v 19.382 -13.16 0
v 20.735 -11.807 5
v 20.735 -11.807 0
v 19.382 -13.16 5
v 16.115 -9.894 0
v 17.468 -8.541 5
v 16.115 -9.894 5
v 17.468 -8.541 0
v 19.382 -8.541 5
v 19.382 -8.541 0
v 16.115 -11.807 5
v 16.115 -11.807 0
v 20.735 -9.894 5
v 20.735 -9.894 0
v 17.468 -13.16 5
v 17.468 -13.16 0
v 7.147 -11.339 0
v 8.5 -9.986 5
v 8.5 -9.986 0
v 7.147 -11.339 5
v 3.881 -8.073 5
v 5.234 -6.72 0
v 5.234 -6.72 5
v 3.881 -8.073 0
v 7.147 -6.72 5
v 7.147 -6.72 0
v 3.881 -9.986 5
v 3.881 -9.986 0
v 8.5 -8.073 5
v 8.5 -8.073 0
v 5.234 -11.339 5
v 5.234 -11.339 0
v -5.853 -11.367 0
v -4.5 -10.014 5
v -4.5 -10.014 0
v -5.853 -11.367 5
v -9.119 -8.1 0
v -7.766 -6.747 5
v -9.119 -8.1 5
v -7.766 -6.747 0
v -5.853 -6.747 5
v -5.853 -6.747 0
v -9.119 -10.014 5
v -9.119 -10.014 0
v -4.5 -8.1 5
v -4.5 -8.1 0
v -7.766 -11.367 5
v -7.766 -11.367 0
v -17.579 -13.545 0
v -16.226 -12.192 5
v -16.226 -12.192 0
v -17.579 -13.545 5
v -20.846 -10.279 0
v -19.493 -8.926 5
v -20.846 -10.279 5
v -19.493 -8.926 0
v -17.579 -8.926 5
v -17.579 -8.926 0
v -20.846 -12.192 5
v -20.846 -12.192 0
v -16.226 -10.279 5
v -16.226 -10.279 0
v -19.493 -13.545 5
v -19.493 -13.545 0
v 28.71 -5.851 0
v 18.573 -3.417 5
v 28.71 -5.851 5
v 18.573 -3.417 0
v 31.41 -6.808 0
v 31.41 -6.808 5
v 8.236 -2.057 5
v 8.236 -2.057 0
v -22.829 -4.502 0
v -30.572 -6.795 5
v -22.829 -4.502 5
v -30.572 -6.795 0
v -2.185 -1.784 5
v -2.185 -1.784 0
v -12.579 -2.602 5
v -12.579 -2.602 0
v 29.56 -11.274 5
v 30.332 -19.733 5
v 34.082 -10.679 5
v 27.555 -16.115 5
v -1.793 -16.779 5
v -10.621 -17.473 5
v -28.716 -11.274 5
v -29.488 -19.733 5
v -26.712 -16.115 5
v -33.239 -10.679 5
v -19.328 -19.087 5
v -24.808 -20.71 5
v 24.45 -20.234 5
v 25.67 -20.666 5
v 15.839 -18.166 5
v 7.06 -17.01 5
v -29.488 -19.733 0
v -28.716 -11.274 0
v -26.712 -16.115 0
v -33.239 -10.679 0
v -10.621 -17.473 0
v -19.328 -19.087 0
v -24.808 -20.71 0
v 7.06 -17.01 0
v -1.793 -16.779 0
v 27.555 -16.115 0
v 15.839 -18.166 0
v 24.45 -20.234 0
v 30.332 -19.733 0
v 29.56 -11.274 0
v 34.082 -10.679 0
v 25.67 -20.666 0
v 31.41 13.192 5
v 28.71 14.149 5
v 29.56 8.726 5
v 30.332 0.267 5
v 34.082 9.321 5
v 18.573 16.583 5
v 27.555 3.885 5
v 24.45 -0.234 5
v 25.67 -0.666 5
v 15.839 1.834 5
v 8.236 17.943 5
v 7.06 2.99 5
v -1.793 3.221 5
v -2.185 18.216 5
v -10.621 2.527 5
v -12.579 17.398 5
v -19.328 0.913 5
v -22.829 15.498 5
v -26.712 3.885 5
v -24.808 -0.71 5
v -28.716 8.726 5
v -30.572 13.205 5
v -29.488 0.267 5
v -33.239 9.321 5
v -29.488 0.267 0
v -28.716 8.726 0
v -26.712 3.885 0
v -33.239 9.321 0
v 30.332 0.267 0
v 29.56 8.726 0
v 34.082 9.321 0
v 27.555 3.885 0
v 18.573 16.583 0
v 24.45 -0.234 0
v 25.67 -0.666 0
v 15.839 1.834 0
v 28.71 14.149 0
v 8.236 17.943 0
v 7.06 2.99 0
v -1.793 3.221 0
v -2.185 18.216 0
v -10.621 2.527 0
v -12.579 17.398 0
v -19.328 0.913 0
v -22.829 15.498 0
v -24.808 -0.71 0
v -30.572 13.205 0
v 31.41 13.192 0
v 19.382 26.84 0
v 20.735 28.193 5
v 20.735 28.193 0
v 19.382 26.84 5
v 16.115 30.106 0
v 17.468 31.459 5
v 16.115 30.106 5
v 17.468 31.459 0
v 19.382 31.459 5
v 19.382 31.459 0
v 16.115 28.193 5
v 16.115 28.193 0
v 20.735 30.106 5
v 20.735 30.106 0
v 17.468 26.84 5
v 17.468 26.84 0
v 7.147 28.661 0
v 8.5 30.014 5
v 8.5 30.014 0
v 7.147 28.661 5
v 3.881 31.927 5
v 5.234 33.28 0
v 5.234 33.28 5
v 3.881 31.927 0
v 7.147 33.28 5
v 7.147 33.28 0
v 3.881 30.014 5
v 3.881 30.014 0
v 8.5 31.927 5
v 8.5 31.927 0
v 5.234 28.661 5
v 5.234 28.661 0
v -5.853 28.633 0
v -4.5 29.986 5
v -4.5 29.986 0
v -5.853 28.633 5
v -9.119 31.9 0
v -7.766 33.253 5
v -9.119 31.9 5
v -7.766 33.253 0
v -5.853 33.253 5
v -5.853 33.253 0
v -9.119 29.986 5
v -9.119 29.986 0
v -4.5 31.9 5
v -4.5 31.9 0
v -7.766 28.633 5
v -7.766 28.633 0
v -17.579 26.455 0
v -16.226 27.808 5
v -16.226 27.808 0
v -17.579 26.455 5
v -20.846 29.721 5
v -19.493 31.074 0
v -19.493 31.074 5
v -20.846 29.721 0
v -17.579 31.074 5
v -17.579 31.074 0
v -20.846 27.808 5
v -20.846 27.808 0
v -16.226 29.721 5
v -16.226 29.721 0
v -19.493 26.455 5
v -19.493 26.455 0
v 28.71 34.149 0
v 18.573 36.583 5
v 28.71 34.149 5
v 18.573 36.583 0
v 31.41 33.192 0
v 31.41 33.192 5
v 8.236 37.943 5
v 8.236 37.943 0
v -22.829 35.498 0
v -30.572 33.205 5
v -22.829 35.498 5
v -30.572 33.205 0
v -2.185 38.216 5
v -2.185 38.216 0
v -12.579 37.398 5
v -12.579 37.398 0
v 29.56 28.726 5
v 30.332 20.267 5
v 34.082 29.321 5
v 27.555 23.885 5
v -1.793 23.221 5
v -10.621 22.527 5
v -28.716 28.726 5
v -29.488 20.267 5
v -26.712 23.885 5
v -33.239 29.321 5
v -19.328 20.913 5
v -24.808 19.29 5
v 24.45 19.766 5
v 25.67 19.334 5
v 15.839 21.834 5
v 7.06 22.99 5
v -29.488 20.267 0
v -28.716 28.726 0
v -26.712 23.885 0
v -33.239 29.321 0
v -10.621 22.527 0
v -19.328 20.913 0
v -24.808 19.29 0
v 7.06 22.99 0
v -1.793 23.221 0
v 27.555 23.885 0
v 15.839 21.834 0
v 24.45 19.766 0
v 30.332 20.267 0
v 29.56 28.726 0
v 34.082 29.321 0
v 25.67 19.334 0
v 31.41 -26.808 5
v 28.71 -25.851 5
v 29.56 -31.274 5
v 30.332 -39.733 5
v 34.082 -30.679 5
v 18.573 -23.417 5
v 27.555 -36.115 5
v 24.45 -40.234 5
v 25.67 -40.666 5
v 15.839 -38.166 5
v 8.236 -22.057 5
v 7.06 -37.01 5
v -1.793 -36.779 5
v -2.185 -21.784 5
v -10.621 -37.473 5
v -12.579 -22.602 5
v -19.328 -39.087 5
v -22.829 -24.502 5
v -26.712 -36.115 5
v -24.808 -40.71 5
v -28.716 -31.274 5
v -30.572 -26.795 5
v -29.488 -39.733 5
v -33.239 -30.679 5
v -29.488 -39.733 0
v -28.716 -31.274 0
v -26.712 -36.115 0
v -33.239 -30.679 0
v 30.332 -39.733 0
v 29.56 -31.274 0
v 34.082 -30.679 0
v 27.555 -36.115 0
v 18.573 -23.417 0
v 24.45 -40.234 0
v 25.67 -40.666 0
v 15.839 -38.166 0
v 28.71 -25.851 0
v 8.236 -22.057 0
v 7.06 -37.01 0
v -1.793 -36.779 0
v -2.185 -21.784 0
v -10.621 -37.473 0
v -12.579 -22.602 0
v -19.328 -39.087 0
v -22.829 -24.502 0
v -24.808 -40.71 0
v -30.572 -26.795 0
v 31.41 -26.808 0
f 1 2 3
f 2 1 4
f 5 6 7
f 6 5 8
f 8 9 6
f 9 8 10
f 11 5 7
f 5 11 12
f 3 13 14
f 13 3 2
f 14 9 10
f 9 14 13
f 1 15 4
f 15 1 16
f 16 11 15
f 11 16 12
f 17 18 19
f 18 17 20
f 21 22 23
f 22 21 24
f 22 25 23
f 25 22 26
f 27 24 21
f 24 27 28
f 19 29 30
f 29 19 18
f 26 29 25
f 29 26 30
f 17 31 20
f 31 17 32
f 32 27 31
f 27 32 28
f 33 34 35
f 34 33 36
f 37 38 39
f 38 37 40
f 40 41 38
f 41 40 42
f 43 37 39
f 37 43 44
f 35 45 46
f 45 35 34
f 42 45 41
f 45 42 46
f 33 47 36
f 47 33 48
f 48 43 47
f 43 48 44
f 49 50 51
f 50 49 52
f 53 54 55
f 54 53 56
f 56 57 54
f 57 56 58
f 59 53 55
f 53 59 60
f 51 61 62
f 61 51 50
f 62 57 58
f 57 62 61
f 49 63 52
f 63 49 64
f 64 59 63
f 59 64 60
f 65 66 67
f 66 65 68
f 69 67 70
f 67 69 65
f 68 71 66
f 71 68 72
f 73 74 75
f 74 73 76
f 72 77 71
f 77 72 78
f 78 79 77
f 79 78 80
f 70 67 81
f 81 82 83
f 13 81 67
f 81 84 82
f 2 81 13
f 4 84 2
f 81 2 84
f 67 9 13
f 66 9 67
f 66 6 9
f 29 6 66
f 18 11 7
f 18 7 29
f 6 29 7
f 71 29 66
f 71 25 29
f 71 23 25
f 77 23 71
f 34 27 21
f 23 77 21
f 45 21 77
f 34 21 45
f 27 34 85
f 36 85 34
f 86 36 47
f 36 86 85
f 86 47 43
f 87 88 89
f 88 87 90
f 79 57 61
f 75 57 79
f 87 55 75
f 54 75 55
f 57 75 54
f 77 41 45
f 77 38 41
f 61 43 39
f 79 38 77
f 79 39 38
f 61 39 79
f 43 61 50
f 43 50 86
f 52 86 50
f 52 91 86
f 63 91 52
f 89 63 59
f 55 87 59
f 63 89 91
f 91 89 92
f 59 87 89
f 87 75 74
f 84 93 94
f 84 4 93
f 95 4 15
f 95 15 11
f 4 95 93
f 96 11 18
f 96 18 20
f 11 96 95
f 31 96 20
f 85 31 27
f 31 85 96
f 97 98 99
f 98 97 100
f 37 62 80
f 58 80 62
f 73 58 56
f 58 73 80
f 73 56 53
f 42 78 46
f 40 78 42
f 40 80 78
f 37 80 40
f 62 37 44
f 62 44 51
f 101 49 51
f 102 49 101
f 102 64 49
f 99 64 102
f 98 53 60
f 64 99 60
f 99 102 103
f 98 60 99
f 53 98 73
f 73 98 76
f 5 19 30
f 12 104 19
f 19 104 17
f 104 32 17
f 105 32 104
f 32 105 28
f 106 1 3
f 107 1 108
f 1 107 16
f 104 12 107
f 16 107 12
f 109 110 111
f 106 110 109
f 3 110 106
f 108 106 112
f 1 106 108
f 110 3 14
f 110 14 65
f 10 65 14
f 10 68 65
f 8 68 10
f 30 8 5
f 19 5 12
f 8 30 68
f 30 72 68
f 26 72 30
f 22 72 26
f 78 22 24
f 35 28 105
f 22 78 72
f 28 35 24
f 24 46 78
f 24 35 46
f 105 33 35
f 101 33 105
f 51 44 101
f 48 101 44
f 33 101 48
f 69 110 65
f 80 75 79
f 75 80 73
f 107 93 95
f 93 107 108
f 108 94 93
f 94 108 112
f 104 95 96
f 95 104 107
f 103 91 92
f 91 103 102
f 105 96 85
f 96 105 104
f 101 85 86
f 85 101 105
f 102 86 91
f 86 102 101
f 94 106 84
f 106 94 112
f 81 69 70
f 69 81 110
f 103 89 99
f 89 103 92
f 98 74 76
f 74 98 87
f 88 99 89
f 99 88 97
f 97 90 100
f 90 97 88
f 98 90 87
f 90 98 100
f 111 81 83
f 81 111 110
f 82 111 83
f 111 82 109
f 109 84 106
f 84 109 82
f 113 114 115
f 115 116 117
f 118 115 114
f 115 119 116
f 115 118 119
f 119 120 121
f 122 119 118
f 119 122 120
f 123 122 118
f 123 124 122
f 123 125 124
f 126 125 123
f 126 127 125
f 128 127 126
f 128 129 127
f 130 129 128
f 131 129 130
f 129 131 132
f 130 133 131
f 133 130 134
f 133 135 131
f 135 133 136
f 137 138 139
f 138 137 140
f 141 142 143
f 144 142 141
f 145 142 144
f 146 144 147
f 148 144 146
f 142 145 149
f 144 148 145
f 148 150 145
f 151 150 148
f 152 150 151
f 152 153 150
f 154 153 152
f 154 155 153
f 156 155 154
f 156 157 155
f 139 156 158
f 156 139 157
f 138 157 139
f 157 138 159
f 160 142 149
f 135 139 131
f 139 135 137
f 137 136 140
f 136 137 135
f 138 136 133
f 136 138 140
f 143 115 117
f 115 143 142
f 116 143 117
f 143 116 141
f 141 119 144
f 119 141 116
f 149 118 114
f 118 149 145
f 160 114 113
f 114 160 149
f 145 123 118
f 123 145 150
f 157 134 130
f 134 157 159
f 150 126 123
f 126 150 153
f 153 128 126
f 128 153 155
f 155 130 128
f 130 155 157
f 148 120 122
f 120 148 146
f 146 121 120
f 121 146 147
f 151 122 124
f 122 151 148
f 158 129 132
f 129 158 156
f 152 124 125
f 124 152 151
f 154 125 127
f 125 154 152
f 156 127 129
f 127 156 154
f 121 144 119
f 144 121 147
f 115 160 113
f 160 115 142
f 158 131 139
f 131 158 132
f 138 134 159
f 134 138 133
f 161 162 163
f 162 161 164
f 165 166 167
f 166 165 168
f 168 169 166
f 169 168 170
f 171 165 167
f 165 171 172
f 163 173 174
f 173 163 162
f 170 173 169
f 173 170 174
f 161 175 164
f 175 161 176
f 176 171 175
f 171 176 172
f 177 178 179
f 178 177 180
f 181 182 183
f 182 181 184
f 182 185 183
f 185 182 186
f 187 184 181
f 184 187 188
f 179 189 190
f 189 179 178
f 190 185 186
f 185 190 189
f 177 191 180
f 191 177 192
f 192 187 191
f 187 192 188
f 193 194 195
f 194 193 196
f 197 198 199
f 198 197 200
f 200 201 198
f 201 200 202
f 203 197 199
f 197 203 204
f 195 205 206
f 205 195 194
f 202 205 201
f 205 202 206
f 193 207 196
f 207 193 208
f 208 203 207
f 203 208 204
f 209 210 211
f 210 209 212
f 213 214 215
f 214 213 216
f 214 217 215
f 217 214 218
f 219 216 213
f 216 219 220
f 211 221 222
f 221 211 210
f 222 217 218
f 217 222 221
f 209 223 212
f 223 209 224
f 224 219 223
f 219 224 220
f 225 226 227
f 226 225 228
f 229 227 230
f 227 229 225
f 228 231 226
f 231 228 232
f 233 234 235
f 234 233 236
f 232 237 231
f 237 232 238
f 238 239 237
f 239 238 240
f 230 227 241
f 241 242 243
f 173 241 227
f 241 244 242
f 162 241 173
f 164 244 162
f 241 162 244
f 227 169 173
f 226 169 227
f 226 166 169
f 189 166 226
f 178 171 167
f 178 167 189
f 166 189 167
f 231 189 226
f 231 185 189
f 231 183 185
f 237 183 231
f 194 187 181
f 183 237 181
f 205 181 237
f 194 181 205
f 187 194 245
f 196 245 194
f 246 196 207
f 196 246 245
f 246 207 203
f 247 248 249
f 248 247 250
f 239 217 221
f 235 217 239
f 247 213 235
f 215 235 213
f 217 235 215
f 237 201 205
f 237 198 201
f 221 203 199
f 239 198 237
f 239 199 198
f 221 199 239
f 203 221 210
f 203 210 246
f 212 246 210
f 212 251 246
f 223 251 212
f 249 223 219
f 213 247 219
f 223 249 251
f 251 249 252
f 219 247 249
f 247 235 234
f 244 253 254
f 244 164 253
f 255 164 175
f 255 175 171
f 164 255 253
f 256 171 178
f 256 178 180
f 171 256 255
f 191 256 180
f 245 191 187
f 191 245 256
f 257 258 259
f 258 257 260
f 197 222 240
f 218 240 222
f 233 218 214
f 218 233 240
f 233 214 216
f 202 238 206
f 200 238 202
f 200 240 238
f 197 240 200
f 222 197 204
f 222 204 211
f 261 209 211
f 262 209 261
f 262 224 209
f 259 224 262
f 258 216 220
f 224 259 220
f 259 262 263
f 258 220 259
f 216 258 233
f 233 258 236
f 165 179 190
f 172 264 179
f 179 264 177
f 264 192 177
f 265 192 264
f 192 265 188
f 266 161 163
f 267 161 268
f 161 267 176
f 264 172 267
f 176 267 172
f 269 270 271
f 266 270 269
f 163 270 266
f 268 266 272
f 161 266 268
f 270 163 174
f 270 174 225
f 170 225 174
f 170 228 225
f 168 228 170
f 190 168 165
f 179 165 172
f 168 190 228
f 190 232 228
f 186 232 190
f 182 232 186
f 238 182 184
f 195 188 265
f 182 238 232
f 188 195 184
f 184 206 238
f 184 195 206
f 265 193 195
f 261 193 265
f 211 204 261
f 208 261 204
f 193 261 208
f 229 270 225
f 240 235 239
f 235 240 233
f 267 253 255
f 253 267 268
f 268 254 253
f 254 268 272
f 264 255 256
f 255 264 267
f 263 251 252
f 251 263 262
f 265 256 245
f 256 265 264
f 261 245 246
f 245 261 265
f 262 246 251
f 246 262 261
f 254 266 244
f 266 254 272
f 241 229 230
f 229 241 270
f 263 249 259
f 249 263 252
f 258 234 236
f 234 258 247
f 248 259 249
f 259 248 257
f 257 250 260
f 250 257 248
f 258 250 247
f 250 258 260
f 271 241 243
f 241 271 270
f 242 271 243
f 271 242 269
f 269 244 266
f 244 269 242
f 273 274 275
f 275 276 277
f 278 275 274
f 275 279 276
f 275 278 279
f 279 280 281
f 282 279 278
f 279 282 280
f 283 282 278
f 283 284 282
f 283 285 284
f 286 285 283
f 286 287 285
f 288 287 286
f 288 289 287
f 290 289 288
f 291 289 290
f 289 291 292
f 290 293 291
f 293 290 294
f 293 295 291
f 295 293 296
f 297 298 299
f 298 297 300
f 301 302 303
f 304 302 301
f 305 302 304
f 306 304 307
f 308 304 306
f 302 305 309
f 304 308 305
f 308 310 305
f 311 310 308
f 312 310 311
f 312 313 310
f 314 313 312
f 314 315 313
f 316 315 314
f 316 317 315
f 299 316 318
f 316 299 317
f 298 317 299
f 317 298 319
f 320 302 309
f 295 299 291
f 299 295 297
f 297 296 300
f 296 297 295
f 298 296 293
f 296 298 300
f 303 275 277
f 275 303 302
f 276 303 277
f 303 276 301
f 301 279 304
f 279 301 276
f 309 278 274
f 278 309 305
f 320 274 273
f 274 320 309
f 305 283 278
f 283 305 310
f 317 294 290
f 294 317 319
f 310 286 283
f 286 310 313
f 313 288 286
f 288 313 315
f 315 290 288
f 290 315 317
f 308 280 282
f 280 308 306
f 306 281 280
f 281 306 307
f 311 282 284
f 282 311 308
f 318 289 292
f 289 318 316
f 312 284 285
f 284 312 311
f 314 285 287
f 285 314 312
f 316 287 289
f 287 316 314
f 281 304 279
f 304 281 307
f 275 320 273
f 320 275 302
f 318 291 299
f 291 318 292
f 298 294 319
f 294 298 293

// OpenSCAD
module core() {union() {
	translate([0,0,-0.05])cylinder(60.1,26,26);
	translate([0,0,60])cylinder(16.05,30,30);
}}
module arch() {
	translate([0,0,25])union() {
		difference() {
			scale([1,1,3.3])rotate([90,0,22.5])translate([0,0,-50])cylinder(100,9,9);
			translate([-50,-50,-50])cube([100,100,50]);
		}
		rotate([0,0,22.5]) translate([-9,-50,-20])cube([18,100,21]);
	}
}
module eTrangle(height,length) {
	rotate([0,0,-30])difference() {
		cube([length,length,height]);
		translate([0,0,-0.5])rotate([0,0,60])cube([length*1.2,length*1.2,height+1]);
		translate([length,0,-0.5])rotate([0,0,30])cube([length*1.2,length*1.2,height+1]);
	}
}
module reel() {
	difference() {
		cylinder(76,37,37,$fn=8);
		core();
		arch();
		rotate([0,0,45]) arch();
		rotate([0,0,90]) arch();
		rotate([0,0,135]) arch();
	}
}
module drumCentre() {
	difference() {
		rotate([0,0,22.5])reel();
		for (i=[0:7]) {
			rotate([0,0,i*45])translate([-42,0,-0.1])#eTrangle(5.2,15);
			rotate([0,0,i*45])translate([-42,0,71])#eTrangle(5.1,15);
		}
		for (i=[0:3]) {
			rotate([90,0,i*45]) translate([0,65,-50]) cylinder(100,2.5,2.5);
		}
	}
}
module arm() {
	translate([34.25,-7.5,0]) difference() {
		union() {
			translate([0,0,0])cube([65,15,5]);
			translate([7.45,7.5,0])rotate([0,0,180])eTrangle(5,14.5);
		}
		translate([5,-0.1,-0.1])cube([45,5.1,5.2]);
		translate([5,10.1,-0.1])cube([45,5.1,5.2]);
		translate([62.5,4,-0.1])rotate([0,0,210])eTrangle(5.2,10);
		translate([62.5,11,-0.1])rotate([0,0,150])eTrangle(5.2,10);
	}
}
module loadArm() {
	import_stl("spool2arm.stl",convexity=10);
}
module edge(withHoles) {
	union() {
		difference() {
			cylinder(5,99.6,99.6,$fn=60);
			translate([0,0,-0.1])cylinder(5.2,84.6,84.6,$fn=60);
			translate([-105,-102.45,-0.1])cube([210,110,10]);
			rotate([0,0,45])translate([-105,-7.55,-0.1])cube([210,110,10]);
			if (withHoles) {
				translate([90.5,18,-0.1]) cylinder(5.2,2.5,2.5);
				translate([87.5,30,-0.1]) cylinder(5.2,2.5,2.5);
				translate([82.5,42,-0.1]) cylinder(5.2,2.5,2.5);
				translate([76,52,-0.1]) cylinder(5.2,2.5,2.5);
			}
		}
		rotate([0,0,45])translate([86.85,-3.6,0])rotate([0,0,-30]) eTrangle(5,9.8);
		translate([96.65,3.6,0])rotate([0,0,150]) eTrangle(5,9.8);
	}
}
module spool() {
	translate([5,0,0])import_stl("spool2core.stl",convexity=10);
	for (i=[0:7]) {
		rotate([0,0,i*45])loadArm();
		rotate([0,0,i*45])translate([0,0,71])loadArm();
		rotate([0,0,i*45])edge((i%2)==0);
		rotate([0,0,i*45])translate([0,0,71])edge((i%2)==1);
	}
}
module explodedSpool() {
	translate([5,0,0])import_stl("spool2core.stl",convexity=10);
	for (i=[0:7]) {
		rotate([0,0,i*45])translate([10,0,0]) loadArm();
		rotate([0,0,i*45])translate([10,0,71])loadArm();
		rotate([0,0,i*45])translate([20,10,0]) edge((i%2)==0);
		rotate([0,0,i*45])translate([20,10,71])edge((i%2)==1);
	}
}

//%color([0.5,0.5,0.5,0.1]) translate([-50,-50,-1.01]) cube([100,100,1]);
module arms(allSix) {
	translate([-75,-6,0]) arm();
	translate([-57,6,0]) arm();
	translate([-57,-18,0]) arm();
	translate([-75,18,0]) arm();
	if (allSix)  {
		translate([-75,-30,0]) arm();
		translate([-57,30,0]) arm();
	}
}
module edges() {
	translate([2,-10,0])rotate([0,0,67.5])translate([-85,-33.5,0]) edge(true);
	translate([2,10,0])rotate([0,0,67.5])translate([-85,-33.5,0]) edge(false);
	translate([2,30,0])rotate([0,0,67.5])translate([-85,-33.5,0]) edge(true);
	translate([2,-30,0])rotate([0,0,67.5])translate([-85,-33.5,0]) edge(false);
}

//arms(false);
edges();
//translate([0,-200,0])arms(true);
//translate([125,-200,0])arm();
//translate([250,-200,0])edges();
//translate([250,0,0])spool();
//explodedSpool();
//translate([125,-200,0])translate([5,0,0])import_stl("spool2core.stl",convexity=10);
// drumCentre();
